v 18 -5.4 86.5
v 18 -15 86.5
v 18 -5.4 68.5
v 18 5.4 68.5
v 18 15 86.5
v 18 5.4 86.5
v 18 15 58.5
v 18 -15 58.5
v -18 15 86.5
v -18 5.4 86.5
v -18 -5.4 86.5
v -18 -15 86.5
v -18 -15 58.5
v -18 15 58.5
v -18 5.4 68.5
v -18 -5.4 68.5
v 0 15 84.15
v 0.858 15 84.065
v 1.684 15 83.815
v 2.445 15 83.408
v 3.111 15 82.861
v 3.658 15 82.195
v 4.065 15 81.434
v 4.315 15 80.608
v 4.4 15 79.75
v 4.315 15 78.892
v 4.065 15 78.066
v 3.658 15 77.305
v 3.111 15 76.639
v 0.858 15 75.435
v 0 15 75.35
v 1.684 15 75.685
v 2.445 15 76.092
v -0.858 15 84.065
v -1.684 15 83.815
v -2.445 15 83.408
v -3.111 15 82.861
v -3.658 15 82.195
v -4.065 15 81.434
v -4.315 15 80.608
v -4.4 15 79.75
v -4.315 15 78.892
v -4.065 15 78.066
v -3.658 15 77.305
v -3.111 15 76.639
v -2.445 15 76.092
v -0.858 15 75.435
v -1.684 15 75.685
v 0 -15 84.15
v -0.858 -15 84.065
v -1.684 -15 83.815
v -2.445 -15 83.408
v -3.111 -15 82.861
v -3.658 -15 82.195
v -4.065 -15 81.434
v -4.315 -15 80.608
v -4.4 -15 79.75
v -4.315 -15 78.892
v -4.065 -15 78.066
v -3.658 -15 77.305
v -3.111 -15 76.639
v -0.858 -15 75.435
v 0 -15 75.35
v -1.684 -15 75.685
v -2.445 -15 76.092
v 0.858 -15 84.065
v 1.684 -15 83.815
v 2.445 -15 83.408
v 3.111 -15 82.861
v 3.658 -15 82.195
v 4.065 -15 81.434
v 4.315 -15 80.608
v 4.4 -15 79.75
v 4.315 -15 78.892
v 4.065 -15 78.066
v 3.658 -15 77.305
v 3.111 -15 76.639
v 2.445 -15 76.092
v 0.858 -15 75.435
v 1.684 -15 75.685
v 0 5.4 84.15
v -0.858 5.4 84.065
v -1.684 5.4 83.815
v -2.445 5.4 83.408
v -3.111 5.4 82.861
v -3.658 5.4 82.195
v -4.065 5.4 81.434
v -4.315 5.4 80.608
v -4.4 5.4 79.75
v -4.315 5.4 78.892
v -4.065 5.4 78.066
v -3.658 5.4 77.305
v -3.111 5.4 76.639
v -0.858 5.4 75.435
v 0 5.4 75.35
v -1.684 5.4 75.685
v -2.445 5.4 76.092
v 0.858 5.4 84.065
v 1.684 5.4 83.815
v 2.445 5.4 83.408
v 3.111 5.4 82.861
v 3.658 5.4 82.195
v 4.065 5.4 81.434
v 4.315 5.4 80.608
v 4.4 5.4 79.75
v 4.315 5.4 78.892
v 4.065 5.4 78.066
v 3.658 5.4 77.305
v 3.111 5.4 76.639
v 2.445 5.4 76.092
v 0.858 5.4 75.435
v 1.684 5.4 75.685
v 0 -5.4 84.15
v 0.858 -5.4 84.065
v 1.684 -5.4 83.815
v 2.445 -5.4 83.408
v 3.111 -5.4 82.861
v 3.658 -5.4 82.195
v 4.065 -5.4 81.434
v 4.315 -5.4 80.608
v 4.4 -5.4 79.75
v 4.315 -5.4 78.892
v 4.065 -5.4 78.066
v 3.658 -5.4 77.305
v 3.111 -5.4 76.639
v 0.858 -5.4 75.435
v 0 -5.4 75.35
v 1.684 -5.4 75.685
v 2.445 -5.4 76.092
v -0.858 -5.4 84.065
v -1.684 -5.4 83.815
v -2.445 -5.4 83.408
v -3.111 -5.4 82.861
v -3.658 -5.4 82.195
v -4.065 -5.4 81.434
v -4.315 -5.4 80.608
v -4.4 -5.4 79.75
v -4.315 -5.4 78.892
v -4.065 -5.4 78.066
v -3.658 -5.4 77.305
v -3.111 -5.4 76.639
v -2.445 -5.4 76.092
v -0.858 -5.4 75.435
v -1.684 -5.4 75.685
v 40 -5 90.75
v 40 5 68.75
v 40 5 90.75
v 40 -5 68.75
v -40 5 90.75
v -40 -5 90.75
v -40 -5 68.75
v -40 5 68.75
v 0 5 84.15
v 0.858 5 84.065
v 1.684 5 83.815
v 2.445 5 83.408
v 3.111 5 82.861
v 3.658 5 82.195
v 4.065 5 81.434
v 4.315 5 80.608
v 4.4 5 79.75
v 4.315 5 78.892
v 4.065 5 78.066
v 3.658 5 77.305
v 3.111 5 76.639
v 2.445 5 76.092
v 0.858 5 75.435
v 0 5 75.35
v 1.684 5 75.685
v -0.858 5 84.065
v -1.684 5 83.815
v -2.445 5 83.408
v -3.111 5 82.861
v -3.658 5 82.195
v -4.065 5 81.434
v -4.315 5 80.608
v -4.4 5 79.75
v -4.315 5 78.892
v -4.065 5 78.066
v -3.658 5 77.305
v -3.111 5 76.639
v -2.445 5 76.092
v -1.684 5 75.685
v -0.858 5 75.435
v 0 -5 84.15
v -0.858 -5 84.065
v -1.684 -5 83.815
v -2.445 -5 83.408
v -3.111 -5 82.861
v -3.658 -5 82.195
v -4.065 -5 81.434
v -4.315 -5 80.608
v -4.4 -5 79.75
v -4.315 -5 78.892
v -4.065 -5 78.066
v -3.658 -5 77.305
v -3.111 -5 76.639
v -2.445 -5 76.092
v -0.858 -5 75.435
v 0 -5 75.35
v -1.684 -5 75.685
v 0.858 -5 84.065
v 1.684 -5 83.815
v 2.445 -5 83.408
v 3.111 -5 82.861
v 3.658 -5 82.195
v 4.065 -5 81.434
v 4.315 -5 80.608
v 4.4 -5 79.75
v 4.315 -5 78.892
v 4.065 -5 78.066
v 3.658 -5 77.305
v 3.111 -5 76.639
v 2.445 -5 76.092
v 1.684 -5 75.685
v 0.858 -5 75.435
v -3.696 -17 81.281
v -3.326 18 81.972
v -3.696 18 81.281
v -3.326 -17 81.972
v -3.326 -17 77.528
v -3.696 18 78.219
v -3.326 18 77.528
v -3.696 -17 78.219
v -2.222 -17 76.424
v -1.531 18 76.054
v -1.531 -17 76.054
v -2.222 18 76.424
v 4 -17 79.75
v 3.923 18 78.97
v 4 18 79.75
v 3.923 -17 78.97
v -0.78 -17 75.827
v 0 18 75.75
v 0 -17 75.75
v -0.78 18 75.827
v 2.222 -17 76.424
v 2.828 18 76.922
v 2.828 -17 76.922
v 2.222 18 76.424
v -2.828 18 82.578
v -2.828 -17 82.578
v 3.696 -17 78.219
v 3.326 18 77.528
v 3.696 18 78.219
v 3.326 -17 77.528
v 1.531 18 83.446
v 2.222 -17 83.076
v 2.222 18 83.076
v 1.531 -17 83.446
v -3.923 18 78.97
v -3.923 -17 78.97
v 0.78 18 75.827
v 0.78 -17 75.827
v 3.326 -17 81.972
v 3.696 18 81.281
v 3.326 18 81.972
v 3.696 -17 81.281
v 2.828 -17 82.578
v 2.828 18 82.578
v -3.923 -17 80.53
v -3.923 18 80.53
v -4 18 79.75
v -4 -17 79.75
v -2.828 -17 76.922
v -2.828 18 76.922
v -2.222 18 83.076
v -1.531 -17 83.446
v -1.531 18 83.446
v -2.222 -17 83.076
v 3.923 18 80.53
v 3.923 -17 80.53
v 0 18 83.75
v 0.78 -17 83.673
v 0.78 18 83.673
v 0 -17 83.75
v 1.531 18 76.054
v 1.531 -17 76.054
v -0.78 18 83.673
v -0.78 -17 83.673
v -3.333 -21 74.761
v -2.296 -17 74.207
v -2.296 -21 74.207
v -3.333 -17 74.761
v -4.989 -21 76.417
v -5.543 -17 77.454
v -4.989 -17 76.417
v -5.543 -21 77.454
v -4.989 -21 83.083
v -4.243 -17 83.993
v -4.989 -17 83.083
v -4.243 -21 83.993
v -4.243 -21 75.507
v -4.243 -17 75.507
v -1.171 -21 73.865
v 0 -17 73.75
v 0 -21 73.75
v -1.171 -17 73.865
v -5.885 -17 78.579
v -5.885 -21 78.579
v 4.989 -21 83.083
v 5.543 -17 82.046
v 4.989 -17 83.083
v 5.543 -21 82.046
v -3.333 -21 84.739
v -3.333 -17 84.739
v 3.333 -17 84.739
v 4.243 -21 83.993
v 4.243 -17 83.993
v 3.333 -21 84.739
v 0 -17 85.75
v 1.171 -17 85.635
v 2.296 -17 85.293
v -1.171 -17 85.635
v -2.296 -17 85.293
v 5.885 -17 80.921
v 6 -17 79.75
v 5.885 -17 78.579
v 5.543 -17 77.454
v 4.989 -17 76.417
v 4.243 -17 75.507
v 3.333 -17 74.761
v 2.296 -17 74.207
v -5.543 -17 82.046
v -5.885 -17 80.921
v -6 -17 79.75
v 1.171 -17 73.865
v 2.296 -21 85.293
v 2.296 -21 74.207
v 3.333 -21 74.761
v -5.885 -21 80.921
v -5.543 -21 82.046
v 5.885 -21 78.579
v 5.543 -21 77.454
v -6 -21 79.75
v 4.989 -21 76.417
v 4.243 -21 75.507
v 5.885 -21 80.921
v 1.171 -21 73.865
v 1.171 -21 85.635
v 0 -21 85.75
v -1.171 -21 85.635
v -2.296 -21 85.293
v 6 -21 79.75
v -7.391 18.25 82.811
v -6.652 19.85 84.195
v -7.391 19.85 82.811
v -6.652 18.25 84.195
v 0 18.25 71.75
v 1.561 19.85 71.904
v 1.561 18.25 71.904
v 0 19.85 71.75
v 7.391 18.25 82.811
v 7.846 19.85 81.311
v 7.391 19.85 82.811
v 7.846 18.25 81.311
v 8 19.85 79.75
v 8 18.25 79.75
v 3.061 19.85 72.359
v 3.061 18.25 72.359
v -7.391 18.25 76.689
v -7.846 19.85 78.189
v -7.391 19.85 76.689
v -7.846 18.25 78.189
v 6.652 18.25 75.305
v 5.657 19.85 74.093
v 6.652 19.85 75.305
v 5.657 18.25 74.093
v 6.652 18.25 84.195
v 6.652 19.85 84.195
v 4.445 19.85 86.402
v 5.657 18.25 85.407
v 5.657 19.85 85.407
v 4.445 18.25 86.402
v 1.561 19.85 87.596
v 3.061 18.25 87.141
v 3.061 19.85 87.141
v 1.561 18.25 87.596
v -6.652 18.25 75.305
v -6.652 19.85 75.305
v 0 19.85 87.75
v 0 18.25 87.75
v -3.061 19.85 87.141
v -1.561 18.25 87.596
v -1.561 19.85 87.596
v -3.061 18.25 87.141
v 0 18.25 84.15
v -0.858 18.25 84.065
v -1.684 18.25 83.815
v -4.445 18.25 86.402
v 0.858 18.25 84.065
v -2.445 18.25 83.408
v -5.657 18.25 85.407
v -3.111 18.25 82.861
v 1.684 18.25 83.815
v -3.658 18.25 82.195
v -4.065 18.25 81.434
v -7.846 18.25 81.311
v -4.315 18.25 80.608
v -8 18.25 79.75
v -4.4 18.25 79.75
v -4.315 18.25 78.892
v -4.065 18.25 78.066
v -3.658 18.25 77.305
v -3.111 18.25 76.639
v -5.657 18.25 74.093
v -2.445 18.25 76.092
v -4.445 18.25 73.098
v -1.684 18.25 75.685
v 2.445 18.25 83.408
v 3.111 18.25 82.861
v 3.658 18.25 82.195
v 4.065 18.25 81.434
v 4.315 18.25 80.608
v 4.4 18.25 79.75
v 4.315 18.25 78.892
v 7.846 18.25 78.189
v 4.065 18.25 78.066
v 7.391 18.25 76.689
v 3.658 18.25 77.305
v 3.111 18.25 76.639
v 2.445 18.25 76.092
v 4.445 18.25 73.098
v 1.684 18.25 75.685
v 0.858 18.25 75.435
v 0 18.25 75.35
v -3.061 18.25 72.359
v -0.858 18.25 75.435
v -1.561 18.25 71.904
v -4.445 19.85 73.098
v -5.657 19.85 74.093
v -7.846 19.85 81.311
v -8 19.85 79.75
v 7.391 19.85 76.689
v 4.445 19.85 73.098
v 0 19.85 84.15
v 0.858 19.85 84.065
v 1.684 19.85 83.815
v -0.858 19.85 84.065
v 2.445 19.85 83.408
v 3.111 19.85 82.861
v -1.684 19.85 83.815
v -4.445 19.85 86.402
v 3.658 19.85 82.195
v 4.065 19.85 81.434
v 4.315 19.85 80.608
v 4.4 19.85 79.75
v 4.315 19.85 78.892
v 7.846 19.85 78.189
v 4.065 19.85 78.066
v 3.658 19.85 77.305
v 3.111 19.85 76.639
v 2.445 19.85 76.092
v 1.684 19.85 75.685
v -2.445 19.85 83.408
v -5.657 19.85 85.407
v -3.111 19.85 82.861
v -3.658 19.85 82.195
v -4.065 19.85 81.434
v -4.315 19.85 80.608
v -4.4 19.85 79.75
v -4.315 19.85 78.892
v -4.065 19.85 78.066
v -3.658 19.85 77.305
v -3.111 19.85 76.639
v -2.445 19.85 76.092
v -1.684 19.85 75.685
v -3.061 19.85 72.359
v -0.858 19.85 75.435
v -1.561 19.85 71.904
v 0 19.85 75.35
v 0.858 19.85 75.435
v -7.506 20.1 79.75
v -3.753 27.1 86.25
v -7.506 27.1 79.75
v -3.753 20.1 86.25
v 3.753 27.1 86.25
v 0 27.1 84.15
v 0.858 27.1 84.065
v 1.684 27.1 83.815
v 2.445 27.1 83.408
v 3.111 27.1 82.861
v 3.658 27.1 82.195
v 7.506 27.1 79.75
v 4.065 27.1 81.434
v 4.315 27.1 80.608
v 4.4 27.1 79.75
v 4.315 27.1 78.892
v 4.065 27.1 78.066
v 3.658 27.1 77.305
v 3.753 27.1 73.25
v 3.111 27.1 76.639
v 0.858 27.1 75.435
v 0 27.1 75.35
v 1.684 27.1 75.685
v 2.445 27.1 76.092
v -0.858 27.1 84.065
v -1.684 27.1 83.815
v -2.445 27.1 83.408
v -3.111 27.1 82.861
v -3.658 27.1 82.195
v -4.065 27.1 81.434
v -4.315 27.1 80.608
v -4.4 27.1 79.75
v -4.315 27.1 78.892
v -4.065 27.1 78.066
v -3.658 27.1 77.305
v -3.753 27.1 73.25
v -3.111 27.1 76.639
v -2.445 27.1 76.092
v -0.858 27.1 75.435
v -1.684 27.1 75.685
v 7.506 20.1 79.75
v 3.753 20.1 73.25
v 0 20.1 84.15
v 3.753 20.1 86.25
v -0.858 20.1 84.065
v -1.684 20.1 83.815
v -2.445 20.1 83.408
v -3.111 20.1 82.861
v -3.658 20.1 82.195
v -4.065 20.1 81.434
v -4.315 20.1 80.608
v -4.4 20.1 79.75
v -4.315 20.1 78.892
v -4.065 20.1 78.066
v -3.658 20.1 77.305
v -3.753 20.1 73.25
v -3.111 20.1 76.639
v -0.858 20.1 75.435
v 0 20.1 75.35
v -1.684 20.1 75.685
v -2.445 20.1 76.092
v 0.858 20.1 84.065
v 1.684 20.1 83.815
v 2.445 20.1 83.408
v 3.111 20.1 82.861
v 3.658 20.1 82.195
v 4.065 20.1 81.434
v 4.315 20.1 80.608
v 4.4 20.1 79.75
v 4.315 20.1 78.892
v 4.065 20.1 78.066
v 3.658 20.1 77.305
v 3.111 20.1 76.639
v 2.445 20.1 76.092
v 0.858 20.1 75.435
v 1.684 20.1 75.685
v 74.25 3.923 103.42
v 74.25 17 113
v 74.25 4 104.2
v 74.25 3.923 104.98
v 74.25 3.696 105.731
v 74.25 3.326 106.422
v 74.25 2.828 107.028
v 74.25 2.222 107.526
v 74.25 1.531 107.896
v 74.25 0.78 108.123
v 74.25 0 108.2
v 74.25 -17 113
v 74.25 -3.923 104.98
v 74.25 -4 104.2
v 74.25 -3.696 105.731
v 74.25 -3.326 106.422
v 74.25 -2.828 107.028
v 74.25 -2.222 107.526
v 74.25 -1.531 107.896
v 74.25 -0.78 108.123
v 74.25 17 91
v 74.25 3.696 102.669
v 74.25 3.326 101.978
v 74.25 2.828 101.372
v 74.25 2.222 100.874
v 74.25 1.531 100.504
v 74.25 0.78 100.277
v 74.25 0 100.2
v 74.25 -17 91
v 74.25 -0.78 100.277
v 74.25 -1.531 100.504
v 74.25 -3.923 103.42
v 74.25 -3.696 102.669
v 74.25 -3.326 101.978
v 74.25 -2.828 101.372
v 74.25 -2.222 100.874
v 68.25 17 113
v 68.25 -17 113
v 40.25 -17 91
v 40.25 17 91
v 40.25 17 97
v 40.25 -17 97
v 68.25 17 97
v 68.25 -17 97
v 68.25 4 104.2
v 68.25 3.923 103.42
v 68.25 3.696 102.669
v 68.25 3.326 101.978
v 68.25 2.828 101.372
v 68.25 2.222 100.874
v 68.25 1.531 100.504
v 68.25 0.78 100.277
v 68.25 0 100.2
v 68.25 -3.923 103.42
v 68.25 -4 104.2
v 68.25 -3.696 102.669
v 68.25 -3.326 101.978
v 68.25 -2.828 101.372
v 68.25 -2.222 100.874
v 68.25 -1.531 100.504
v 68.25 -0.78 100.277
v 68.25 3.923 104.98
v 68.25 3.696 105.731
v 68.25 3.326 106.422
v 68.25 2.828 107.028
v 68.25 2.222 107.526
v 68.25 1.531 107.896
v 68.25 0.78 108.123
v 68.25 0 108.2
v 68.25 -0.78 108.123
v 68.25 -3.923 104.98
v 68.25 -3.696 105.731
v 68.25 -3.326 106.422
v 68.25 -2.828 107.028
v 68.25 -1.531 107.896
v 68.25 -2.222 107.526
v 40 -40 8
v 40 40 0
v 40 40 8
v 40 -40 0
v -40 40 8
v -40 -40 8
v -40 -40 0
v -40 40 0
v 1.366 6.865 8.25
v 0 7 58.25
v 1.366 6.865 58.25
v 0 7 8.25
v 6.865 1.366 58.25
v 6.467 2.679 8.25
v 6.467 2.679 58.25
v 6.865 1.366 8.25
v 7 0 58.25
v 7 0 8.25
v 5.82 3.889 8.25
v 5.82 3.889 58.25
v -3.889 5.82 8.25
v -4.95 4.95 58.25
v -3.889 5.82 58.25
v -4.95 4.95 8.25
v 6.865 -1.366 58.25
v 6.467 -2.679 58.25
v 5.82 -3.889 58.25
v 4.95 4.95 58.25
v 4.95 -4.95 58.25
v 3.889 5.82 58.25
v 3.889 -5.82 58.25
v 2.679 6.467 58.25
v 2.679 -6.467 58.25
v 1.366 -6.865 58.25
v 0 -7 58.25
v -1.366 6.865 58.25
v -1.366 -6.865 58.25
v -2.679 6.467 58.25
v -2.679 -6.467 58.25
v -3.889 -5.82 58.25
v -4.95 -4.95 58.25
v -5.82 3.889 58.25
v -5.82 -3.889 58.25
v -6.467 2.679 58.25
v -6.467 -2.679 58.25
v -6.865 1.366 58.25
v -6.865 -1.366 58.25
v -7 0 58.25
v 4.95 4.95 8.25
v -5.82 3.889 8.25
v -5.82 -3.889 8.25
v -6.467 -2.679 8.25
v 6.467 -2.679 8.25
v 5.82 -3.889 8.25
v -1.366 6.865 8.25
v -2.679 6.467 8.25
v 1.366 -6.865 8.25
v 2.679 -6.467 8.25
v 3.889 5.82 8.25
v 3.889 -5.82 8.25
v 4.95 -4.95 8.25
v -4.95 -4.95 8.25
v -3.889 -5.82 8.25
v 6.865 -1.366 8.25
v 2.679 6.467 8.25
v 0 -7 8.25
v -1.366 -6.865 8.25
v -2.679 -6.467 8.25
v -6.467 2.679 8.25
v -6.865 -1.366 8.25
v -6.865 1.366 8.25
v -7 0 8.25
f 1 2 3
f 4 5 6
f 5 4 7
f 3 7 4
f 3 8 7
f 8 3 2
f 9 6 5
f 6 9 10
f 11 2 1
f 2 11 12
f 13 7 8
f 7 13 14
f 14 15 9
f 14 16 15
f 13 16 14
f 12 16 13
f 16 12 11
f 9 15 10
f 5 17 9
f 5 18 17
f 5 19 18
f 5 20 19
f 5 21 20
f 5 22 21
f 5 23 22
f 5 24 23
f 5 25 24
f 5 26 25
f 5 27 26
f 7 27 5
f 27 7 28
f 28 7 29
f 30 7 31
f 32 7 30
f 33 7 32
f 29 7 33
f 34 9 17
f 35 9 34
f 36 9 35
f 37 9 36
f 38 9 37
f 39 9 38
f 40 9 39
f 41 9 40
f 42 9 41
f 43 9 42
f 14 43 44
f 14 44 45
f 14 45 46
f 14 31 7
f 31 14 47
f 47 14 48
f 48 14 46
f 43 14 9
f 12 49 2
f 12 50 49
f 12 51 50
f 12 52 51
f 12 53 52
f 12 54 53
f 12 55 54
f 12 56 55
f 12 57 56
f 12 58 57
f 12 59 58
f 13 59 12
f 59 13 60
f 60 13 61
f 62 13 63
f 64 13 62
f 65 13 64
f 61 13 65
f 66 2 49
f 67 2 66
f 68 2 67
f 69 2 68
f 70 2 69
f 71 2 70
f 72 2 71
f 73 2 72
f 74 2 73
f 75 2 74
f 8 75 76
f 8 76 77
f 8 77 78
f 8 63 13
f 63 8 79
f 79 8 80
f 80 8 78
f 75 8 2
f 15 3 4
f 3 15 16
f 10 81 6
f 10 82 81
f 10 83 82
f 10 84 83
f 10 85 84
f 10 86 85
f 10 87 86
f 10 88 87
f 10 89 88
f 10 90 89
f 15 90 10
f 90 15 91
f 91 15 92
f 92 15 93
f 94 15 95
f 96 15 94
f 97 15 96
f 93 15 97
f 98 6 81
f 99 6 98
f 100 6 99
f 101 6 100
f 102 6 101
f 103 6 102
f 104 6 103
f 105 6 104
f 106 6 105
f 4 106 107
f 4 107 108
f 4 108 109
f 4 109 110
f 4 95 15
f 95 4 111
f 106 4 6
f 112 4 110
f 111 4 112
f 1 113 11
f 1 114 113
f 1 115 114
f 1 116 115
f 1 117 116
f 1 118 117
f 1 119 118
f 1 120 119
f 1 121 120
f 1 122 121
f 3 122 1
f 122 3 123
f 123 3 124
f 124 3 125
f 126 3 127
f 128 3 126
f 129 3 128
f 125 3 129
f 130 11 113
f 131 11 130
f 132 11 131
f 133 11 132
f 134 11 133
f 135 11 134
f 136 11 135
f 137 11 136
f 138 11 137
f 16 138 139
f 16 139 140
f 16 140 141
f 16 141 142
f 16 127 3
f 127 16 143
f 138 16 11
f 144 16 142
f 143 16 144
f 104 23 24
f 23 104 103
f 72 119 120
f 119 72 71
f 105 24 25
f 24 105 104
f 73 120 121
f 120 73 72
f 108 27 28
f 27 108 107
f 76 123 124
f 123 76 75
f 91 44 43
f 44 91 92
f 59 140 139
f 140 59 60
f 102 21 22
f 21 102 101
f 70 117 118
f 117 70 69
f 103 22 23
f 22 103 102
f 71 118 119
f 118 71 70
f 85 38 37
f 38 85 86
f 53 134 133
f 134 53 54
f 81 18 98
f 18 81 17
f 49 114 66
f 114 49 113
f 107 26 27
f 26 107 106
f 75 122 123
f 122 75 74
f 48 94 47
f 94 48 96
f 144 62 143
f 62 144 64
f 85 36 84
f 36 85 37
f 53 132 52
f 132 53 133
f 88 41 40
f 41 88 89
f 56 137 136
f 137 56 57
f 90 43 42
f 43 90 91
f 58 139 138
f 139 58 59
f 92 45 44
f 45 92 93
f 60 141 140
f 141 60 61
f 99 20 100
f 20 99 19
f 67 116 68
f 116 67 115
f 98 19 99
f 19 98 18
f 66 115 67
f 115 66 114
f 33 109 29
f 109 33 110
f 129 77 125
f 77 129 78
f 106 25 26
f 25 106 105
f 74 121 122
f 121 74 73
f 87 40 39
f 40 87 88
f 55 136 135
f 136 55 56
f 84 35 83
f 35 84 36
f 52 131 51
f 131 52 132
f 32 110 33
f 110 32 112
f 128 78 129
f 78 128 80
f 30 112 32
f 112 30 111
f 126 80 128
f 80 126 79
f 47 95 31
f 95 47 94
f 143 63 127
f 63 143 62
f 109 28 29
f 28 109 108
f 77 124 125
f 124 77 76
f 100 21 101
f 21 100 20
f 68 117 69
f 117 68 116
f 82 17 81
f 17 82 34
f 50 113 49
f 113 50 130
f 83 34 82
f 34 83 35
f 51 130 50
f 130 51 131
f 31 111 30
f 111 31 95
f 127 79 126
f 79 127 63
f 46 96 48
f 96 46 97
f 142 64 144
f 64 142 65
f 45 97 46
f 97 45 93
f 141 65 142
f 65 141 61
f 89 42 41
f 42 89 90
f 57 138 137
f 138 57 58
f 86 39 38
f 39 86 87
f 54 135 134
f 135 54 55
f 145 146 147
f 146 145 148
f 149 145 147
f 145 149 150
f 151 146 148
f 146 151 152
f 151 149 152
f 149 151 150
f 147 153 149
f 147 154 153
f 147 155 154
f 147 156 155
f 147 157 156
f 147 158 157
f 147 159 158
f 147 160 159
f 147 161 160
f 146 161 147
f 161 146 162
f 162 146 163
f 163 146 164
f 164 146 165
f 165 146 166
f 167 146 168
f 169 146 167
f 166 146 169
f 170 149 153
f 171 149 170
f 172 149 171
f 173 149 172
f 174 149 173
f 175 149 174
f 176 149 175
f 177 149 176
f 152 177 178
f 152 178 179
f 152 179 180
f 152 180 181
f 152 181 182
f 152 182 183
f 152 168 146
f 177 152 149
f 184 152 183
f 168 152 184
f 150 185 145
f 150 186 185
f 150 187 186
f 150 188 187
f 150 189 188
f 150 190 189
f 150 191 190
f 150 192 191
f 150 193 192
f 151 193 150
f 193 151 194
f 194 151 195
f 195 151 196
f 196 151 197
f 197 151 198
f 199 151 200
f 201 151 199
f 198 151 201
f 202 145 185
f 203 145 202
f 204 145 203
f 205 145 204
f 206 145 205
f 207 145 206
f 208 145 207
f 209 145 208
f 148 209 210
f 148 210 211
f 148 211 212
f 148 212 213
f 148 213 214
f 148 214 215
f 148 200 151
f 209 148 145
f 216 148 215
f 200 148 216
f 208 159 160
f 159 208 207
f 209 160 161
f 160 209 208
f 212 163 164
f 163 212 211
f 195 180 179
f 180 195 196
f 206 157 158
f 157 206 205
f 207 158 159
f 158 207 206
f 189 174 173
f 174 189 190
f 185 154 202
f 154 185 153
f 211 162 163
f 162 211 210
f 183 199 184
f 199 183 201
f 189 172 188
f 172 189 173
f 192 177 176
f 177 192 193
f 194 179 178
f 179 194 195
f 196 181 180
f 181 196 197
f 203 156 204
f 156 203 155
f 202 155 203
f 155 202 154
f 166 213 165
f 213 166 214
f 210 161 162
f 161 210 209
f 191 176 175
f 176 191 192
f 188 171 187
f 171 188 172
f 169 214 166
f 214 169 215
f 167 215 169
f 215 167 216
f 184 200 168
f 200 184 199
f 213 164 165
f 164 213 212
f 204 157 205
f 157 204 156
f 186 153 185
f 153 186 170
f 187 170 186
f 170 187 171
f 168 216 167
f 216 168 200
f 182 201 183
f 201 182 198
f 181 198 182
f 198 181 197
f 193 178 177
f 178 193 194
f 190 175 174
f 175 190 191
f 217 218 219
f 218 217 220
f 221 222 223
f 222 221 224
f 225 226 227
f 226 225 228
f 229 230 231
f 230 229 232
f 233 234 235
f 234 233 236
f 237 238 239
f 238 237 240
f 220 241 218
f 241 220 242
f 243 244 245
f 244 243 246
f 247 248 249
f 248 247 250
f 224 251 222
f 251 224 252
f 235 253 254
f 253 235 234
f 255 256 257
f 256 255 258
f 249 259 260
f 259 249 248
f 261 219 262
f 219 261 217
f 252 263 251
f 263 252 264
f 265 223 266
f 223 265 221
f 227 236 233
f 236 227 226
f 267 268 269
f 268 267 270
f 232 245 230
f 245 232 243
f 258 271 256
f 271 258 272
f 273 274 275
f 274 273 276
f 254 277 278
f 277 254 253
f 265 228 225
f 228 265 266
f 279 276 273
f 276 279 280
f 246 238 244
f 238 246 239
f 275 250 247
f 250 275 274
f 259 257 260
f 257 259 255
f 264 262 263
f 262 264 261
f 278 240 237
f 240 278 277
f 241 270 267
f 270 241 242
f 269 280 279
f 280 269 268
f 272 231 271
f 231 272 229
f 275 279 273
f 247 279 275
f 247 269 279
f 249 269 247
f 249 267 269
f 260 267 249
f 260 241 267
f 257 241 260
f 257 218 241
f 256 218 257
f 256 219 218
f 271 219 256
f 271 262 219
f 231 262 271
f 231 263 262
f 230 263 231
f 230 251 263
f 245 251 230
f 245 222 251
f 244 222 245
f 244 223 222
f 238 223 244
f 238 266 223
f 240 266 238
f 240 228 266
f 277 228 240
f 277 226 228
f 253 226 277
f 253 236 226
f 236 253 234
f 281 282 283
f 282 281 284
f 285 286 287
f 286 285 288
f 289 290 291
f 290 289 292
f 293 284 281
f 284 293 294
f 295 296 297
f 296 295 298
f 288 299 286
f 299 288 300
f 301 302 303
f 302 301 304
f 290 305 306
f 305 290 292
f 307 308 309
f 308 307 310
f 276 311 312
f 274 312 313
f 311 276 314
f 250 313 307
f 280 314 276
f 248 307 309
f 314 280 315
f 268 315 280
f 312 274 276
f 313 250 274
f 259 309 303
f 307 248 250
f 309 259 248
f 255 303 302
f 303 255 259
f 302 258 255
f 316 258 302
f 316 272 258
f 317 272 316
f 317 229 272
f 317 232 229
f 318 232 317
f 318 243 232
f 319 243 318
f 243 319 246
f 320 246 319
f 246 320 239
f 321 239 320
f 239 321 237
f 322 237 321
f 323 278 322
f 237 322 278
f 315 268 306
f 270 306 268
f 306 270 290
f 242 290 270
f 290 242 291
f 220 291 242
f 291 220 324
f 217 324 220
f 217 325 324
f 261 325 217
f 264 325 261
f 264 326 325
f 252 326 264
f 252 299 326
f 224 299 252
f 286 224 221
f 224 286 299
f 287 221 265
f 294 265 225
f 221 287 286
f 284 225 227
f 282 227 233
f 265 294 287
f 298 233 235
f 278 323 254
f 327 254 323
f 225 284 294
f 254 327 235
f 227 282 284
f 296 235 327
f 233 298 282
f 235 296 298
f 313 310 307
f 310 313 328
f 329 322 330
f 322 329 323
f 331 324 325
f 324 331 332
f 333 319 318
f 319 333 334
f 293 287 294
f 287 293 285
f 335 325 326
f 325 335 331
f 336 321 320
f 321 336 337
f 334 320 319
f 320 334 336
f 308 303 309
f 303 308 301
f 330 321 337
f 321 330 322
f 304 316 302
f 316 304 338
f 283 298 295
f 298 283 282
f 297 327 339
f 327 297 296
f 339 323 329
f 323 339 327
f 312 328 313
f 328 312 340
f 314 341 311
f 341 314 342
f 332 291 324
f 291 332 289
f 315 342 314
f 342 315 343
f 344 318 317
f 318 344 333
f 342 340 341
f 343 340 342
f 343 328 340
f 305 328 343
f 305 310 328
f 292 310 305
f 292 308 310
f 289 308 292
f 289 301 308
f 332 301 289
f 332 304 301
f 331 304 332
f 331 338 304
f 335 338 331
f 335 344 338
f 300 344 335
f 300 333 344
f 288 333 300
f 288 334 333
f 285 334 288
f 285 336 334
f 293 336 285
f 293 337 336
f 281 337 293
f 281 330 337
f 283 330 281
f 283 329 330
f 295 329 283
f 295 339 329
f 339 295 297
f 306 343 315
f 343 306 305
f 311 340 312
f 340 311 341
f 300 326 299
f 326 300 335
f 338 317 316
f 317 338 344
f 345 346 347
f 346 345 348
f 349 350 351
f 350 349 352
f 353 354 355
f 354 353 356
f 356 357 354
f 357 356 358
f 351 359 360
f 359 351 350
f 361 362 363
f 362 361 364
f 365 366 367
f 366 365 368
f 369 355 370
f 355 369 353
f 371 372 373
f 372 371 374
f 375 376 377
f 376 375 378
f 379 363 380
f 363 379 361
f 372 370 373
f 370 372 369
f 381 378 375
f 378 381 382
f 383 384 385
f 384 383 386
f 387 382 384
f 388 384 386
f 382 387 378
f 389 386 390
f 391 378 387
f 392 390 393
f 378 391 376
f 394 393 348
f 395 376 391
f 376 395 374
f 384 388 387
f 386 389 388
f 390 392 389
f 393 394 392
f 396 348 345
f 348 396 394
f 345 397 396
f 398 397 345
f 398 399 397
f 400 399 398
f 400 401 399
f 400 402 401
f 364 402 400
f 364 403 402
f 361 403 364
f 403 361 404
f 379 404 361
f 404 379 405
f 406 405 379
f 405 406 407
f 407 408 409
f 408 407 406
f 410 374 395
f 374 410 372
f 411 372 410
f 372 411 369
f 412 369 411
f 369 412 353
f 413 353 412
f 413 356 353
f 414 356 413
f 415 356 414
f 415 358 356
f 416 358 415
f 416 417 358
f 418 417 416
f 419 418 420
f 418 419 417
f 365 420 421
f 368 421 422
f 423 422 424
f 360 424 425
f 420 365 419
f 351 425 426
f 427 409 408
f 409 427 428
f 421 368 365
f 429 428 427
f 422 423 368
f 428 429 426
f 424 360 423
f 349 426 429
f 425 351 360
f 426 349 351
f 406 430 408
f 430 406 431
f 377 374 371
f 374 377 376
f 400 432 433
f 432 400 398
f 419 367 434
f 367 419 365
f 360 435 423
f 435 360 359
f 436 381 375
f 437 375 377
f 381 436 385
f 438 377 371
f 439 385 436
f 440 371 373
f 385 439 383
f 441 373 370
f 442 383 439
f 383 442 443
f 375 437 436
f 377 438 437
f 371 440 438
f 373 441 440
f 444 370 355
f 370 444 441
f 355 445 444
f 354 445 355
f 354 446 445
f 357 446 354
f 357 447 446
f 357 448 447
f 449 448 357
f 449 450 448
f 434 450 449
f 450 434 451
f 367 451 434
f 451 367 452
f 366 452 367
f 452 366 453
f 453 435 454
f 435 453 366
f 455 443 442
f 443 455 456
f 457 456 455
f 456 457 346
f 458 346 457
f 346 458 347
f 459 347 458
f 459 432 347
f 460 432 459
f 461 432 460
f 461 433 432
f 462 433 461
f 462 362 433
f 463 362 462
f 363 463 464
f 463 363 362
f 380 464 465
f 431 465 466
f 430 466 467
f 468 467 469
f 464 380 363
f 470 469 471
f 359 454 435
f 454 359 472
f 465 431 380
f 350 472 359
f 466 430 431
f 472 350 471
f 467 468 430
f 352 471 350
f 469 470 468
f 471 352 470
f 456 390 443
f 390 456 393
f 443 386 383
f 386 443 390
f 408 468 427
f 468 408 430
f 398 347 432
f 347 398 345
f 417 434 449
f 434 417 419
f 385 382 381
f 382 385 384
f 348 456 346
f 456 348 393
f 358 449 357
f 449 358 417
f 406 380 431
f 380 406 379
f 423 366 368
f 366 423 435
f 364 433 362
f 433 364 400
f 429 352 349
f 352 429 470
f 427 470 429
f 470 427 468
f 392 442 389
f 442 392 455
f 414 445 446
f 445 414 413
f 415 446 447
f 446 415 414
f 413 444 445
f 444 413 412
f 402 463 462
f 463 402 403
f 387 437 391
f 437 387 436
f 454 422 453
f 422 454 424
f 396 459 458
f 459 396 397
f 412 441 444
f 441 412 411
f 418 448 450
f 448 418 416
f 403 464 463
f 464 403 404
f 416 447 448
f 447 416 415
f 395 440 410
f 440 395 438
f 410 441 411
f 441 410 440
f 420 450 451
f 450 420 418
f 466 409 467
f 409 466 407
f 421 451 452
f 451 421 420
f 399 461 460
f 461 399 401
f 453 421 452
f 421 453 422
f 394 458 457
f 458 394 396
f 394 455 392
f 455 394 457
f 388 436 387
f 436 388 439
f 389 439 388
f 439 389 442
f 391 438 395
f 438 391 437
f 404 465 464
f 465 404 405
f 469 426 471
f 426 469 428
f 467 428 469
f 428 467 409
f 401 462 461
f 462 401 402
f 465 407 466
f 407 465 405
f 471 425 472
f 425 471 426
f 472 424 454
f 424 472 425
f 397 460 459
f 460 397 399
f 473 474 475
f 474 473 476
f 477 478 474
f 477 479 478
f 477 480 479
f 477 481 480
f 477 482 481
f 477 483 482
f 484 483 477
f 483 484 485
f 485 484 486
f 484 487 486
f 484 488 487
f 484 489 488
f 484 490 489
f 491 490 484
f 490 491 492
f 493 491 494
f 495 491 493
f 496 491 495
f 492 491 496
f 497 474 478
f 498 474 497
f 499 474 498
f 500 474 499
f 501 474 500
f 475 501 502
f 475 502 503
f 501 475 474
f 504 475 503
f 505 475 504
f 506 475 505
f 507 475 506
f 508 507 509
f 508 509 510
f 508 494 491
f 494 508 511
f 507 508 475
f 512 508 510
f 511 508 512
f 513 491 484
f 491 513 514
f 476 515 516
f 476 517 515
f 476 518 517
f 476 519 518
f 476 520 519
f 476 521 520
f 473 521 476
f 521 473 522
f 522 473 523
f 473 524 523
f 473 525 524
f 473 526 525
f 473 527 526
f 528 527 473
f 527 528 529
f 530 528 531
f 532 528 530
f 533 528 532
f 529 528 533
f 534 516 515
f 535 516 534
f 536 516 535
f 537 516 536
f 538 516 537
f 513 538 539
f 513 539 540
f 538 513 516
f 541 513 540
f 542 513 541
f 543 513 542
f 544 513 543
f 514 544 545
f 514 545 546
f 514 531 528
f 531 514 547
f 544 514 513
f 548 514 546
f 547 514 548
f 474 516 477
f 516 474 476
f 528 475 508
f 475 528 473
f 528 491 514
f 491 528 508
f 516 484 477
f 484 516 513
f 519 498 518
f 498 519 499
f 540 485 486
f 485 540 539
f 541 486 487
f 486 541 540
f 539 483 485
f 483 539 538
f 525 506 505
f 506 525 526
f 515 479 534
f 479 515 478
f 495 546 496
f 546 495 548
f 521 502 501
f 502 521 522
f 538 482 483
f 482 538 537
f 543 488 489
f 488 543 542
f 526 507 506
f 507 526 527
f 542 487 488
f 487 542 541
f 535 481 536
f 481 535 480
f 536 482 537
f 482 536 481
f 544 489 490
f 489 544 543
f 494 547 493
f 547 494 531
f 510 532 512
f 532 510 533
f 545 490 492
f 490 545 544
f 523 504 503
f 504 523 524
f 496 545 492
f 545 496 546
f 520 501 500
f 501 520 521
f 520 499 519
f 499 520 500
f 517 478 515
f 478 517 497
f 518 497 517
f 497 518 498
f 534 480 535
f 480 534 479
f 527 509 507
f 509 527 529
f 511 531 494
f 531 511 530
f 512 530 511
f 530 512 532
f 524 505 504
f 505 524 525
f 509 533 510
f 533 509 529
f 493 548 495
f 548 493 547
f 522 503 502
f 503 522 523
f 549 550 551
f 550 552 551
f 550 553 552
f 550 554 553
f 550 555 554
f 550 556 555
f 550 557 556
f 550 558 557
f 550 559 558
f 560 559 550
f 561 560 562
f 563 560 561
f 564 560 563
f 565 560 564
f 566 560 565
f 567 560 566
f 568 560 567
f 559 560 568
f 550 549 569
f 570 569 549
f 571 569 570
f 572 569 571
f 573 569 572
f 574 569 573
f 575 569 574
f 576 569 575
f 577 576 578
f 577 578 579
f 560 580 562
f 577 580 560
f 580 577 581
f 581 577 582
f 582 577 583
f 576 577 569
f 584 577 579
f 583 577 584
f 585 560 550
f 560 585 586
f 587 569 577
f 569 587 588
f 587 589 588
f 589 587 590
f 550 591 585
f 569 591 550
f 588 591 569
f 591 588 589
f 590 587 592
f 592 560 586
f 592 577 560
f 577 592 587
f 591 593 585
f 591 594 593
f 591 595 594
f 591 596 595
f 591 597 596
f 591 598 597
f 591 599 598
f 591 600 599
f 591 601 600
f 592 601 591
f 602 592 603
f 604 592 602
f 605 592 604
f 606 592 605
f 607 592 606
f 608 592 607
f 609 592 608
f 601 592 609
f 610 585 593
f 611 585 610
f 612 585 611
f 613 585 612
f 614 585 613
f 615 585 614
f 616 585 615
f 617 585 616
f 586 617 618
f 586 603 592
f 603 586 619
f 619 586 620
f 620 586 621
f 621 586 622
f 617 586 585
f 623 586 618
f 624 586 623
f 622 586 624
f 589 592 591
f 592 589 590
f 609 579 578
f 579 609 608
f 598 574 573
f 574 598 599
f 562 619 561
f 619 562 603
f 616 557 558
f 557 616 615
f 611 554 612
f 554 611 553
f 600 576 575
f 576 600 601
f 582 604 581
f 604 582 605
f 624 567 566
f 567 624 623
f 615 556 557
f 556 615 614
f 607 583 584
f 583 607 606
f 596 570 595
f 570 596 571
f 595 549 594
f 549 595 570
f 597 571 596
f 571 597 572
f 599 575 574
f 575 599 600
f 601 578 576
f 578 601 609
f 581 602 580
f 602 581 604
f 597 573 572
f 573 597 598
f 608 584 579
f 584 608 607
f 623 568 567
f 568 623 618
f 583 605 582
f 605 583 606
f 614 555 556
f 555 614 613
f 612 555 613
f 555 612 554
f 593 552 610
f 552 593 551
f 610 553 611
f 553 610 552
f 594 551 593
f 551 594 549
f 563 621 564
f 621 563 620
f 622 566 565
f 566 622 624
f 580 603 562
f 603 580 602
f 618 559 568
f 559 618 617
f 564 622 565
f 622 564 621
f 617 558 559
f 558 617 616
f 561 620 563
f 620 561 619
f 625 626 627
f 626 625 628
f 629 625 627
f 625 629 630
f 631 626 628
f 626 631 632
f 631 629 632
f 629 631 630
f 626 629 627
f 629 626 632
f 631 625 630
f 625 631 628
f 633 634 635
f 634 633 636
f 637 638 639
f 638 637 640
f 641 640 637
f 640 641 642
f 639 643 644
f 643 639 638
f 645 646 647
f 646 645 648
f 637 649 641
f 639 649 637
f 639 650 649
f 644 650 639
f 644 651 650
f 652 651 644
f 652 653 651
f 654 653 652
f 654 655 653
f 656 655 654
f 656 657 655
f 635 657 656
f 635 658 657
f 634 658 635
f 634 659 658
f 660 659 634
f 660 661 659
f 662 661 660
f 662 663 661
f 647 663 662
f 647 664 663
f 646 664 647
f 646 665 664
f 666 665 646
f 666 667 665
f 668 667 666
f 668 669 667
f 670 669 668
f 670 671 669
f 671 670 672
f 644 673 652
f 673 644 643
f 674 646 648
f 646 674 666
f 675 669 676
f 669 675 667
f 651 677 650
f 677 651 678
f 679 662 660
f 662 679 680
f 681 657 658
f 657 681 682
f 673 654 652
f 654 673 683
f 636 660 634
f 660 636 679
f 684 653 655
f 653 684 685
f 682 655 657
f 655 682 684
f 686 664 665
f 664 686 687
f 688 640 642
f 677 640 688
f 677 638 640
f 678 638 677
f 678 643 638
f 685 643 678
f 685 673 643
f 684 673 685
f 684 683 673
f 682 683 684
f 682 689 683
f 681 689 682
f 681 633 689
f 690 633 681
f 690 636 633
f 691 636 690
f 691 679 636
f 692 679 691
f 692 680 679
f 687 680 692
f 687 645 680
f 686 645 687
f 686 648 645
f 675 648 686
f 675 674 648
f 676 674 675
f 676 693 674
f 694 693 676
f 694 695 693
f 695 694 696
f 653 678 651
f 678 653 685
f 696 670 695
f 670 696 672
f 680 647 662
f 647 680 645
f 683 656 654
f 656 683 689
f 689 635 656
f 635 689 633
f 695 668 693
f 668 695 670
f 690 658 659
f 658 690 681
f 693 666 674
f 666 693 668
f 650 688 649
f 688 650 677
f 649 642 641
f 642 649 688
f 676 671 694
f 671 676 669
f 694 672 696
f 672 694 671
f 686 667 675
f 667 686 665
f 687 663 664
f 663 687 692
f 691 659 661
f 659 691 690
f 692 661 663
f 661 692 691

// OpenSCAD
$fn = 32;

// ------------------------------------------------------------------------
// Lamp arm: column d14 x 50 mm, arm 80 mm
// Every part is its own module, assembly() places every instance.
// ------------------------------------------------------------------------

// --- part 1 ---
module lamp_base() {
  difference() {
    translate([-40, -40, 0]) cube([80, 80, 8]);
  }
}

// --- part 2 ---
module lamp_column() {
  cylinder(h = 50, d = 14);
}

// --- part 3 ---
module head_fork() {
  difference() {
    translate([-18, -15, 0]) cube([36, 30, 28]);
    translate([-19, -5.4, 10]) cube([38, 10.8, 19]);
    translate([0, 0, 21.25]) rotate([90, 0, 0]) cylinder(h = 32, d = 8.8, center = true);
  }
}

// --- part 4 ---
module lamp_arm() {
  difference() {
    translate([-40, -5, 0]) cube([80, 10, 22]);
    translate([0, 0, 11]) rotate([90, 0, 0]) cylinder(h = 12, d = 8.8, center = true);
  }
}

// --- part 5 ---
module arm_pin() {
  rotate([0, 90, 0]) cylinder(h = 36, d = 8, center = true);
  translate([-21, 0, 0]) rotate([0, 90, 0]) cylinder(h = 4, d = 12);
}

// --- part 6 ---
module arm_washer() {
  difference() {
      translate([0, 0, 0]) cylinder(h = 1.6, d = 16);
      translate([0, 0, -1]) cylinder(h = 3.6, d = 8.8);
    }
}

// --- part 7 ---
module arm_nut() {
  difference() {
    linear_extrude(height = 7) polygon(points = [[7.506, 0], [3.753, 6.5], [-3.753, 6.5], [-7.506, 0], [-3.753, -6.5], [3.753, -6.5]]);
    translate([0, 0, -1]) cylinder(h = 9, d = 8.8);
  }
}

// --- part 8 ---
module shade_bracket() {
  difference() {
    translate([-17, -17, 0]) cube([34, 34, 22]);
    translate([-18, -18, 6]) cube([29, 36, 17]);
    translate([14, 0, 13.2]) rotate([0, 90, 0]) cylinder(h = 8, d = 8, center = true);
  }
}

// --- assembly ---
module assembly() {
  color([0.80, 0.24, 0.20]) translate([0, 0, 0]) rotate([0, 0, 0]) lamp_base();
  color([0.20, 0.45, 0.75]) translate([0, 0, 8.25]) rotate([0, 0, 0]) lamp_column();
  color([0.25, 0.62, 0.32]) translate([0, 0, 58.5]) rotate([0, 0, 0]) head_fork();
  color([0.92, 0.70, 0.18]) translate([0, 0, 68.75]) rotate([0, 0, 0]) lamp_arm();
  color([0.58, 0.35, 0.70]) translate([0, 0, 79.75]) rotate([0, 0, 90]) arm_pin();
  color([0.16, 0.66, 0.66]) translate([0, 19.85, 79.75]) rotate([90, 0, 0]) arm_washer();
  color([0.85, 0.48, 0.18]) translate([0, 27.1, 79.75]) rotate([90, 0, 0]) arm_nut();
  color([0.55, 0.60, 0.65]) translate([57.25, 0, 91]) rotate([0, 0, 0]) shade_bracket();
}

assembly();
